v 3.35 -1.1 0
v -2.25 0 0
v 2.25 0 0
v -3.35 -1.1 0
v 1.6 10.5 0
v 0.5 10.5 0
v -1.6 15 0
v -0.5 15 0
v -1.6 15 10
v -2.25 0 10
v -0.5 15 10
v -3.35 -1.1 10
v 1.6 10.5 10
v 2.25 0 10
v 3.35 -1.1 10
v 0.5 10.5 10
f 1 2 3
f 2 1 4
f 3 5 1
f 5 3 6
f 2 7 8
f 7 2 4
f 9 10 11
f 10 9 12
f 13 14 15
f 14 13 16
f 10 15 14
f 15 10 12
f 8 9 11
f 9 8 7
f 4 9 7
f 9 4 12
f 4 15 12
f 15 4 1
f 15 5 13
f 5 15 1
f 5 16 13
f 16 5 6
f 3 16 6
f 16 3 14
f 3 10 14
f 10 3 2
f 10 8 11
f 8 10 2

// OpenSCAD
// [FL_INDEX: keywords="openscad, 3d_parametric, Customizable_Tumbler_Tag_with_Symbol, csg_solid" | COT="Parametric OpenSCAD design from 3DCodeverse"]
// Title: Customizable Tumbler Tag with Symbol

// Tumbler Tag by xifle
// Modified by teejaydub to add an embossed image.

// preview[view:west, tilt:top diagonal]
/* [Global] */

// The maximum glass thickness this tag will work with [mm]
GLASS_MAX = 3.5;

// The minimum glass thickness this tag will work with [mm]
GLASS_MIN = 1;

// The height of the tag [mm]
HEIGHT = 15; //[5:30]

// The width of the tag [mm]
WIDTH = 10; //[5:30]

// Wall thickness [mm]
WALL = 1.1;

// Load a 30x30 pixel image to be embossed onto your tag.  
// Simple shapes with blurry edges work best. 
// Try the Invert Colors checkbox!
image_file = "symbol.dat"; // [image_surface:30x30]

/* [Hidden] */

RADIUS = (WALL-0.1)/2;

ANGLE = atan2(GLASS_MAX/2, HEIGHT);

SYMBOL_WIDTH = WIDTH * 0.8;

difference() {
	linear_extrude(height=WIDTH) {
		union() {
			halfed_outline(GLASS_MAX, GLASS_MIN, HEIGHT*0.7, RADIUS, WALL);
			mirror([1,0,0]) {
				halfed_outline(GLASS_MAX, GLASS_MIN, HEIGHT, RADIUS, WALL);
			}
		}
	}
	translate([-GLASS_MAX/2-WALL, HEIGHT/2, WIDTH/2])
		rotate([90-ANGLE, -90, 90])
//			resize([SYMBOL_WIDTH, SYMBOL_WIDTH, 0])  // not supported by Customizer
//				scale([1, 1, WALL]) 
			scale([SYMBOL_WIDTH/30, SYMBOL_WIDTH/30, WALL]) 
				surface(file=image_file, center=true, convexity=5); 
}

module halfed_outline(max, min, height, radius, wall) {
	polygon(points=[[0,0],[max/2+radius,0],[min/2,height],[min/2+wall,height], 
		[max/2+radius+wall,-wall], [0,-wall]], paths=[[0,1,2,3,4,5]]);
}
